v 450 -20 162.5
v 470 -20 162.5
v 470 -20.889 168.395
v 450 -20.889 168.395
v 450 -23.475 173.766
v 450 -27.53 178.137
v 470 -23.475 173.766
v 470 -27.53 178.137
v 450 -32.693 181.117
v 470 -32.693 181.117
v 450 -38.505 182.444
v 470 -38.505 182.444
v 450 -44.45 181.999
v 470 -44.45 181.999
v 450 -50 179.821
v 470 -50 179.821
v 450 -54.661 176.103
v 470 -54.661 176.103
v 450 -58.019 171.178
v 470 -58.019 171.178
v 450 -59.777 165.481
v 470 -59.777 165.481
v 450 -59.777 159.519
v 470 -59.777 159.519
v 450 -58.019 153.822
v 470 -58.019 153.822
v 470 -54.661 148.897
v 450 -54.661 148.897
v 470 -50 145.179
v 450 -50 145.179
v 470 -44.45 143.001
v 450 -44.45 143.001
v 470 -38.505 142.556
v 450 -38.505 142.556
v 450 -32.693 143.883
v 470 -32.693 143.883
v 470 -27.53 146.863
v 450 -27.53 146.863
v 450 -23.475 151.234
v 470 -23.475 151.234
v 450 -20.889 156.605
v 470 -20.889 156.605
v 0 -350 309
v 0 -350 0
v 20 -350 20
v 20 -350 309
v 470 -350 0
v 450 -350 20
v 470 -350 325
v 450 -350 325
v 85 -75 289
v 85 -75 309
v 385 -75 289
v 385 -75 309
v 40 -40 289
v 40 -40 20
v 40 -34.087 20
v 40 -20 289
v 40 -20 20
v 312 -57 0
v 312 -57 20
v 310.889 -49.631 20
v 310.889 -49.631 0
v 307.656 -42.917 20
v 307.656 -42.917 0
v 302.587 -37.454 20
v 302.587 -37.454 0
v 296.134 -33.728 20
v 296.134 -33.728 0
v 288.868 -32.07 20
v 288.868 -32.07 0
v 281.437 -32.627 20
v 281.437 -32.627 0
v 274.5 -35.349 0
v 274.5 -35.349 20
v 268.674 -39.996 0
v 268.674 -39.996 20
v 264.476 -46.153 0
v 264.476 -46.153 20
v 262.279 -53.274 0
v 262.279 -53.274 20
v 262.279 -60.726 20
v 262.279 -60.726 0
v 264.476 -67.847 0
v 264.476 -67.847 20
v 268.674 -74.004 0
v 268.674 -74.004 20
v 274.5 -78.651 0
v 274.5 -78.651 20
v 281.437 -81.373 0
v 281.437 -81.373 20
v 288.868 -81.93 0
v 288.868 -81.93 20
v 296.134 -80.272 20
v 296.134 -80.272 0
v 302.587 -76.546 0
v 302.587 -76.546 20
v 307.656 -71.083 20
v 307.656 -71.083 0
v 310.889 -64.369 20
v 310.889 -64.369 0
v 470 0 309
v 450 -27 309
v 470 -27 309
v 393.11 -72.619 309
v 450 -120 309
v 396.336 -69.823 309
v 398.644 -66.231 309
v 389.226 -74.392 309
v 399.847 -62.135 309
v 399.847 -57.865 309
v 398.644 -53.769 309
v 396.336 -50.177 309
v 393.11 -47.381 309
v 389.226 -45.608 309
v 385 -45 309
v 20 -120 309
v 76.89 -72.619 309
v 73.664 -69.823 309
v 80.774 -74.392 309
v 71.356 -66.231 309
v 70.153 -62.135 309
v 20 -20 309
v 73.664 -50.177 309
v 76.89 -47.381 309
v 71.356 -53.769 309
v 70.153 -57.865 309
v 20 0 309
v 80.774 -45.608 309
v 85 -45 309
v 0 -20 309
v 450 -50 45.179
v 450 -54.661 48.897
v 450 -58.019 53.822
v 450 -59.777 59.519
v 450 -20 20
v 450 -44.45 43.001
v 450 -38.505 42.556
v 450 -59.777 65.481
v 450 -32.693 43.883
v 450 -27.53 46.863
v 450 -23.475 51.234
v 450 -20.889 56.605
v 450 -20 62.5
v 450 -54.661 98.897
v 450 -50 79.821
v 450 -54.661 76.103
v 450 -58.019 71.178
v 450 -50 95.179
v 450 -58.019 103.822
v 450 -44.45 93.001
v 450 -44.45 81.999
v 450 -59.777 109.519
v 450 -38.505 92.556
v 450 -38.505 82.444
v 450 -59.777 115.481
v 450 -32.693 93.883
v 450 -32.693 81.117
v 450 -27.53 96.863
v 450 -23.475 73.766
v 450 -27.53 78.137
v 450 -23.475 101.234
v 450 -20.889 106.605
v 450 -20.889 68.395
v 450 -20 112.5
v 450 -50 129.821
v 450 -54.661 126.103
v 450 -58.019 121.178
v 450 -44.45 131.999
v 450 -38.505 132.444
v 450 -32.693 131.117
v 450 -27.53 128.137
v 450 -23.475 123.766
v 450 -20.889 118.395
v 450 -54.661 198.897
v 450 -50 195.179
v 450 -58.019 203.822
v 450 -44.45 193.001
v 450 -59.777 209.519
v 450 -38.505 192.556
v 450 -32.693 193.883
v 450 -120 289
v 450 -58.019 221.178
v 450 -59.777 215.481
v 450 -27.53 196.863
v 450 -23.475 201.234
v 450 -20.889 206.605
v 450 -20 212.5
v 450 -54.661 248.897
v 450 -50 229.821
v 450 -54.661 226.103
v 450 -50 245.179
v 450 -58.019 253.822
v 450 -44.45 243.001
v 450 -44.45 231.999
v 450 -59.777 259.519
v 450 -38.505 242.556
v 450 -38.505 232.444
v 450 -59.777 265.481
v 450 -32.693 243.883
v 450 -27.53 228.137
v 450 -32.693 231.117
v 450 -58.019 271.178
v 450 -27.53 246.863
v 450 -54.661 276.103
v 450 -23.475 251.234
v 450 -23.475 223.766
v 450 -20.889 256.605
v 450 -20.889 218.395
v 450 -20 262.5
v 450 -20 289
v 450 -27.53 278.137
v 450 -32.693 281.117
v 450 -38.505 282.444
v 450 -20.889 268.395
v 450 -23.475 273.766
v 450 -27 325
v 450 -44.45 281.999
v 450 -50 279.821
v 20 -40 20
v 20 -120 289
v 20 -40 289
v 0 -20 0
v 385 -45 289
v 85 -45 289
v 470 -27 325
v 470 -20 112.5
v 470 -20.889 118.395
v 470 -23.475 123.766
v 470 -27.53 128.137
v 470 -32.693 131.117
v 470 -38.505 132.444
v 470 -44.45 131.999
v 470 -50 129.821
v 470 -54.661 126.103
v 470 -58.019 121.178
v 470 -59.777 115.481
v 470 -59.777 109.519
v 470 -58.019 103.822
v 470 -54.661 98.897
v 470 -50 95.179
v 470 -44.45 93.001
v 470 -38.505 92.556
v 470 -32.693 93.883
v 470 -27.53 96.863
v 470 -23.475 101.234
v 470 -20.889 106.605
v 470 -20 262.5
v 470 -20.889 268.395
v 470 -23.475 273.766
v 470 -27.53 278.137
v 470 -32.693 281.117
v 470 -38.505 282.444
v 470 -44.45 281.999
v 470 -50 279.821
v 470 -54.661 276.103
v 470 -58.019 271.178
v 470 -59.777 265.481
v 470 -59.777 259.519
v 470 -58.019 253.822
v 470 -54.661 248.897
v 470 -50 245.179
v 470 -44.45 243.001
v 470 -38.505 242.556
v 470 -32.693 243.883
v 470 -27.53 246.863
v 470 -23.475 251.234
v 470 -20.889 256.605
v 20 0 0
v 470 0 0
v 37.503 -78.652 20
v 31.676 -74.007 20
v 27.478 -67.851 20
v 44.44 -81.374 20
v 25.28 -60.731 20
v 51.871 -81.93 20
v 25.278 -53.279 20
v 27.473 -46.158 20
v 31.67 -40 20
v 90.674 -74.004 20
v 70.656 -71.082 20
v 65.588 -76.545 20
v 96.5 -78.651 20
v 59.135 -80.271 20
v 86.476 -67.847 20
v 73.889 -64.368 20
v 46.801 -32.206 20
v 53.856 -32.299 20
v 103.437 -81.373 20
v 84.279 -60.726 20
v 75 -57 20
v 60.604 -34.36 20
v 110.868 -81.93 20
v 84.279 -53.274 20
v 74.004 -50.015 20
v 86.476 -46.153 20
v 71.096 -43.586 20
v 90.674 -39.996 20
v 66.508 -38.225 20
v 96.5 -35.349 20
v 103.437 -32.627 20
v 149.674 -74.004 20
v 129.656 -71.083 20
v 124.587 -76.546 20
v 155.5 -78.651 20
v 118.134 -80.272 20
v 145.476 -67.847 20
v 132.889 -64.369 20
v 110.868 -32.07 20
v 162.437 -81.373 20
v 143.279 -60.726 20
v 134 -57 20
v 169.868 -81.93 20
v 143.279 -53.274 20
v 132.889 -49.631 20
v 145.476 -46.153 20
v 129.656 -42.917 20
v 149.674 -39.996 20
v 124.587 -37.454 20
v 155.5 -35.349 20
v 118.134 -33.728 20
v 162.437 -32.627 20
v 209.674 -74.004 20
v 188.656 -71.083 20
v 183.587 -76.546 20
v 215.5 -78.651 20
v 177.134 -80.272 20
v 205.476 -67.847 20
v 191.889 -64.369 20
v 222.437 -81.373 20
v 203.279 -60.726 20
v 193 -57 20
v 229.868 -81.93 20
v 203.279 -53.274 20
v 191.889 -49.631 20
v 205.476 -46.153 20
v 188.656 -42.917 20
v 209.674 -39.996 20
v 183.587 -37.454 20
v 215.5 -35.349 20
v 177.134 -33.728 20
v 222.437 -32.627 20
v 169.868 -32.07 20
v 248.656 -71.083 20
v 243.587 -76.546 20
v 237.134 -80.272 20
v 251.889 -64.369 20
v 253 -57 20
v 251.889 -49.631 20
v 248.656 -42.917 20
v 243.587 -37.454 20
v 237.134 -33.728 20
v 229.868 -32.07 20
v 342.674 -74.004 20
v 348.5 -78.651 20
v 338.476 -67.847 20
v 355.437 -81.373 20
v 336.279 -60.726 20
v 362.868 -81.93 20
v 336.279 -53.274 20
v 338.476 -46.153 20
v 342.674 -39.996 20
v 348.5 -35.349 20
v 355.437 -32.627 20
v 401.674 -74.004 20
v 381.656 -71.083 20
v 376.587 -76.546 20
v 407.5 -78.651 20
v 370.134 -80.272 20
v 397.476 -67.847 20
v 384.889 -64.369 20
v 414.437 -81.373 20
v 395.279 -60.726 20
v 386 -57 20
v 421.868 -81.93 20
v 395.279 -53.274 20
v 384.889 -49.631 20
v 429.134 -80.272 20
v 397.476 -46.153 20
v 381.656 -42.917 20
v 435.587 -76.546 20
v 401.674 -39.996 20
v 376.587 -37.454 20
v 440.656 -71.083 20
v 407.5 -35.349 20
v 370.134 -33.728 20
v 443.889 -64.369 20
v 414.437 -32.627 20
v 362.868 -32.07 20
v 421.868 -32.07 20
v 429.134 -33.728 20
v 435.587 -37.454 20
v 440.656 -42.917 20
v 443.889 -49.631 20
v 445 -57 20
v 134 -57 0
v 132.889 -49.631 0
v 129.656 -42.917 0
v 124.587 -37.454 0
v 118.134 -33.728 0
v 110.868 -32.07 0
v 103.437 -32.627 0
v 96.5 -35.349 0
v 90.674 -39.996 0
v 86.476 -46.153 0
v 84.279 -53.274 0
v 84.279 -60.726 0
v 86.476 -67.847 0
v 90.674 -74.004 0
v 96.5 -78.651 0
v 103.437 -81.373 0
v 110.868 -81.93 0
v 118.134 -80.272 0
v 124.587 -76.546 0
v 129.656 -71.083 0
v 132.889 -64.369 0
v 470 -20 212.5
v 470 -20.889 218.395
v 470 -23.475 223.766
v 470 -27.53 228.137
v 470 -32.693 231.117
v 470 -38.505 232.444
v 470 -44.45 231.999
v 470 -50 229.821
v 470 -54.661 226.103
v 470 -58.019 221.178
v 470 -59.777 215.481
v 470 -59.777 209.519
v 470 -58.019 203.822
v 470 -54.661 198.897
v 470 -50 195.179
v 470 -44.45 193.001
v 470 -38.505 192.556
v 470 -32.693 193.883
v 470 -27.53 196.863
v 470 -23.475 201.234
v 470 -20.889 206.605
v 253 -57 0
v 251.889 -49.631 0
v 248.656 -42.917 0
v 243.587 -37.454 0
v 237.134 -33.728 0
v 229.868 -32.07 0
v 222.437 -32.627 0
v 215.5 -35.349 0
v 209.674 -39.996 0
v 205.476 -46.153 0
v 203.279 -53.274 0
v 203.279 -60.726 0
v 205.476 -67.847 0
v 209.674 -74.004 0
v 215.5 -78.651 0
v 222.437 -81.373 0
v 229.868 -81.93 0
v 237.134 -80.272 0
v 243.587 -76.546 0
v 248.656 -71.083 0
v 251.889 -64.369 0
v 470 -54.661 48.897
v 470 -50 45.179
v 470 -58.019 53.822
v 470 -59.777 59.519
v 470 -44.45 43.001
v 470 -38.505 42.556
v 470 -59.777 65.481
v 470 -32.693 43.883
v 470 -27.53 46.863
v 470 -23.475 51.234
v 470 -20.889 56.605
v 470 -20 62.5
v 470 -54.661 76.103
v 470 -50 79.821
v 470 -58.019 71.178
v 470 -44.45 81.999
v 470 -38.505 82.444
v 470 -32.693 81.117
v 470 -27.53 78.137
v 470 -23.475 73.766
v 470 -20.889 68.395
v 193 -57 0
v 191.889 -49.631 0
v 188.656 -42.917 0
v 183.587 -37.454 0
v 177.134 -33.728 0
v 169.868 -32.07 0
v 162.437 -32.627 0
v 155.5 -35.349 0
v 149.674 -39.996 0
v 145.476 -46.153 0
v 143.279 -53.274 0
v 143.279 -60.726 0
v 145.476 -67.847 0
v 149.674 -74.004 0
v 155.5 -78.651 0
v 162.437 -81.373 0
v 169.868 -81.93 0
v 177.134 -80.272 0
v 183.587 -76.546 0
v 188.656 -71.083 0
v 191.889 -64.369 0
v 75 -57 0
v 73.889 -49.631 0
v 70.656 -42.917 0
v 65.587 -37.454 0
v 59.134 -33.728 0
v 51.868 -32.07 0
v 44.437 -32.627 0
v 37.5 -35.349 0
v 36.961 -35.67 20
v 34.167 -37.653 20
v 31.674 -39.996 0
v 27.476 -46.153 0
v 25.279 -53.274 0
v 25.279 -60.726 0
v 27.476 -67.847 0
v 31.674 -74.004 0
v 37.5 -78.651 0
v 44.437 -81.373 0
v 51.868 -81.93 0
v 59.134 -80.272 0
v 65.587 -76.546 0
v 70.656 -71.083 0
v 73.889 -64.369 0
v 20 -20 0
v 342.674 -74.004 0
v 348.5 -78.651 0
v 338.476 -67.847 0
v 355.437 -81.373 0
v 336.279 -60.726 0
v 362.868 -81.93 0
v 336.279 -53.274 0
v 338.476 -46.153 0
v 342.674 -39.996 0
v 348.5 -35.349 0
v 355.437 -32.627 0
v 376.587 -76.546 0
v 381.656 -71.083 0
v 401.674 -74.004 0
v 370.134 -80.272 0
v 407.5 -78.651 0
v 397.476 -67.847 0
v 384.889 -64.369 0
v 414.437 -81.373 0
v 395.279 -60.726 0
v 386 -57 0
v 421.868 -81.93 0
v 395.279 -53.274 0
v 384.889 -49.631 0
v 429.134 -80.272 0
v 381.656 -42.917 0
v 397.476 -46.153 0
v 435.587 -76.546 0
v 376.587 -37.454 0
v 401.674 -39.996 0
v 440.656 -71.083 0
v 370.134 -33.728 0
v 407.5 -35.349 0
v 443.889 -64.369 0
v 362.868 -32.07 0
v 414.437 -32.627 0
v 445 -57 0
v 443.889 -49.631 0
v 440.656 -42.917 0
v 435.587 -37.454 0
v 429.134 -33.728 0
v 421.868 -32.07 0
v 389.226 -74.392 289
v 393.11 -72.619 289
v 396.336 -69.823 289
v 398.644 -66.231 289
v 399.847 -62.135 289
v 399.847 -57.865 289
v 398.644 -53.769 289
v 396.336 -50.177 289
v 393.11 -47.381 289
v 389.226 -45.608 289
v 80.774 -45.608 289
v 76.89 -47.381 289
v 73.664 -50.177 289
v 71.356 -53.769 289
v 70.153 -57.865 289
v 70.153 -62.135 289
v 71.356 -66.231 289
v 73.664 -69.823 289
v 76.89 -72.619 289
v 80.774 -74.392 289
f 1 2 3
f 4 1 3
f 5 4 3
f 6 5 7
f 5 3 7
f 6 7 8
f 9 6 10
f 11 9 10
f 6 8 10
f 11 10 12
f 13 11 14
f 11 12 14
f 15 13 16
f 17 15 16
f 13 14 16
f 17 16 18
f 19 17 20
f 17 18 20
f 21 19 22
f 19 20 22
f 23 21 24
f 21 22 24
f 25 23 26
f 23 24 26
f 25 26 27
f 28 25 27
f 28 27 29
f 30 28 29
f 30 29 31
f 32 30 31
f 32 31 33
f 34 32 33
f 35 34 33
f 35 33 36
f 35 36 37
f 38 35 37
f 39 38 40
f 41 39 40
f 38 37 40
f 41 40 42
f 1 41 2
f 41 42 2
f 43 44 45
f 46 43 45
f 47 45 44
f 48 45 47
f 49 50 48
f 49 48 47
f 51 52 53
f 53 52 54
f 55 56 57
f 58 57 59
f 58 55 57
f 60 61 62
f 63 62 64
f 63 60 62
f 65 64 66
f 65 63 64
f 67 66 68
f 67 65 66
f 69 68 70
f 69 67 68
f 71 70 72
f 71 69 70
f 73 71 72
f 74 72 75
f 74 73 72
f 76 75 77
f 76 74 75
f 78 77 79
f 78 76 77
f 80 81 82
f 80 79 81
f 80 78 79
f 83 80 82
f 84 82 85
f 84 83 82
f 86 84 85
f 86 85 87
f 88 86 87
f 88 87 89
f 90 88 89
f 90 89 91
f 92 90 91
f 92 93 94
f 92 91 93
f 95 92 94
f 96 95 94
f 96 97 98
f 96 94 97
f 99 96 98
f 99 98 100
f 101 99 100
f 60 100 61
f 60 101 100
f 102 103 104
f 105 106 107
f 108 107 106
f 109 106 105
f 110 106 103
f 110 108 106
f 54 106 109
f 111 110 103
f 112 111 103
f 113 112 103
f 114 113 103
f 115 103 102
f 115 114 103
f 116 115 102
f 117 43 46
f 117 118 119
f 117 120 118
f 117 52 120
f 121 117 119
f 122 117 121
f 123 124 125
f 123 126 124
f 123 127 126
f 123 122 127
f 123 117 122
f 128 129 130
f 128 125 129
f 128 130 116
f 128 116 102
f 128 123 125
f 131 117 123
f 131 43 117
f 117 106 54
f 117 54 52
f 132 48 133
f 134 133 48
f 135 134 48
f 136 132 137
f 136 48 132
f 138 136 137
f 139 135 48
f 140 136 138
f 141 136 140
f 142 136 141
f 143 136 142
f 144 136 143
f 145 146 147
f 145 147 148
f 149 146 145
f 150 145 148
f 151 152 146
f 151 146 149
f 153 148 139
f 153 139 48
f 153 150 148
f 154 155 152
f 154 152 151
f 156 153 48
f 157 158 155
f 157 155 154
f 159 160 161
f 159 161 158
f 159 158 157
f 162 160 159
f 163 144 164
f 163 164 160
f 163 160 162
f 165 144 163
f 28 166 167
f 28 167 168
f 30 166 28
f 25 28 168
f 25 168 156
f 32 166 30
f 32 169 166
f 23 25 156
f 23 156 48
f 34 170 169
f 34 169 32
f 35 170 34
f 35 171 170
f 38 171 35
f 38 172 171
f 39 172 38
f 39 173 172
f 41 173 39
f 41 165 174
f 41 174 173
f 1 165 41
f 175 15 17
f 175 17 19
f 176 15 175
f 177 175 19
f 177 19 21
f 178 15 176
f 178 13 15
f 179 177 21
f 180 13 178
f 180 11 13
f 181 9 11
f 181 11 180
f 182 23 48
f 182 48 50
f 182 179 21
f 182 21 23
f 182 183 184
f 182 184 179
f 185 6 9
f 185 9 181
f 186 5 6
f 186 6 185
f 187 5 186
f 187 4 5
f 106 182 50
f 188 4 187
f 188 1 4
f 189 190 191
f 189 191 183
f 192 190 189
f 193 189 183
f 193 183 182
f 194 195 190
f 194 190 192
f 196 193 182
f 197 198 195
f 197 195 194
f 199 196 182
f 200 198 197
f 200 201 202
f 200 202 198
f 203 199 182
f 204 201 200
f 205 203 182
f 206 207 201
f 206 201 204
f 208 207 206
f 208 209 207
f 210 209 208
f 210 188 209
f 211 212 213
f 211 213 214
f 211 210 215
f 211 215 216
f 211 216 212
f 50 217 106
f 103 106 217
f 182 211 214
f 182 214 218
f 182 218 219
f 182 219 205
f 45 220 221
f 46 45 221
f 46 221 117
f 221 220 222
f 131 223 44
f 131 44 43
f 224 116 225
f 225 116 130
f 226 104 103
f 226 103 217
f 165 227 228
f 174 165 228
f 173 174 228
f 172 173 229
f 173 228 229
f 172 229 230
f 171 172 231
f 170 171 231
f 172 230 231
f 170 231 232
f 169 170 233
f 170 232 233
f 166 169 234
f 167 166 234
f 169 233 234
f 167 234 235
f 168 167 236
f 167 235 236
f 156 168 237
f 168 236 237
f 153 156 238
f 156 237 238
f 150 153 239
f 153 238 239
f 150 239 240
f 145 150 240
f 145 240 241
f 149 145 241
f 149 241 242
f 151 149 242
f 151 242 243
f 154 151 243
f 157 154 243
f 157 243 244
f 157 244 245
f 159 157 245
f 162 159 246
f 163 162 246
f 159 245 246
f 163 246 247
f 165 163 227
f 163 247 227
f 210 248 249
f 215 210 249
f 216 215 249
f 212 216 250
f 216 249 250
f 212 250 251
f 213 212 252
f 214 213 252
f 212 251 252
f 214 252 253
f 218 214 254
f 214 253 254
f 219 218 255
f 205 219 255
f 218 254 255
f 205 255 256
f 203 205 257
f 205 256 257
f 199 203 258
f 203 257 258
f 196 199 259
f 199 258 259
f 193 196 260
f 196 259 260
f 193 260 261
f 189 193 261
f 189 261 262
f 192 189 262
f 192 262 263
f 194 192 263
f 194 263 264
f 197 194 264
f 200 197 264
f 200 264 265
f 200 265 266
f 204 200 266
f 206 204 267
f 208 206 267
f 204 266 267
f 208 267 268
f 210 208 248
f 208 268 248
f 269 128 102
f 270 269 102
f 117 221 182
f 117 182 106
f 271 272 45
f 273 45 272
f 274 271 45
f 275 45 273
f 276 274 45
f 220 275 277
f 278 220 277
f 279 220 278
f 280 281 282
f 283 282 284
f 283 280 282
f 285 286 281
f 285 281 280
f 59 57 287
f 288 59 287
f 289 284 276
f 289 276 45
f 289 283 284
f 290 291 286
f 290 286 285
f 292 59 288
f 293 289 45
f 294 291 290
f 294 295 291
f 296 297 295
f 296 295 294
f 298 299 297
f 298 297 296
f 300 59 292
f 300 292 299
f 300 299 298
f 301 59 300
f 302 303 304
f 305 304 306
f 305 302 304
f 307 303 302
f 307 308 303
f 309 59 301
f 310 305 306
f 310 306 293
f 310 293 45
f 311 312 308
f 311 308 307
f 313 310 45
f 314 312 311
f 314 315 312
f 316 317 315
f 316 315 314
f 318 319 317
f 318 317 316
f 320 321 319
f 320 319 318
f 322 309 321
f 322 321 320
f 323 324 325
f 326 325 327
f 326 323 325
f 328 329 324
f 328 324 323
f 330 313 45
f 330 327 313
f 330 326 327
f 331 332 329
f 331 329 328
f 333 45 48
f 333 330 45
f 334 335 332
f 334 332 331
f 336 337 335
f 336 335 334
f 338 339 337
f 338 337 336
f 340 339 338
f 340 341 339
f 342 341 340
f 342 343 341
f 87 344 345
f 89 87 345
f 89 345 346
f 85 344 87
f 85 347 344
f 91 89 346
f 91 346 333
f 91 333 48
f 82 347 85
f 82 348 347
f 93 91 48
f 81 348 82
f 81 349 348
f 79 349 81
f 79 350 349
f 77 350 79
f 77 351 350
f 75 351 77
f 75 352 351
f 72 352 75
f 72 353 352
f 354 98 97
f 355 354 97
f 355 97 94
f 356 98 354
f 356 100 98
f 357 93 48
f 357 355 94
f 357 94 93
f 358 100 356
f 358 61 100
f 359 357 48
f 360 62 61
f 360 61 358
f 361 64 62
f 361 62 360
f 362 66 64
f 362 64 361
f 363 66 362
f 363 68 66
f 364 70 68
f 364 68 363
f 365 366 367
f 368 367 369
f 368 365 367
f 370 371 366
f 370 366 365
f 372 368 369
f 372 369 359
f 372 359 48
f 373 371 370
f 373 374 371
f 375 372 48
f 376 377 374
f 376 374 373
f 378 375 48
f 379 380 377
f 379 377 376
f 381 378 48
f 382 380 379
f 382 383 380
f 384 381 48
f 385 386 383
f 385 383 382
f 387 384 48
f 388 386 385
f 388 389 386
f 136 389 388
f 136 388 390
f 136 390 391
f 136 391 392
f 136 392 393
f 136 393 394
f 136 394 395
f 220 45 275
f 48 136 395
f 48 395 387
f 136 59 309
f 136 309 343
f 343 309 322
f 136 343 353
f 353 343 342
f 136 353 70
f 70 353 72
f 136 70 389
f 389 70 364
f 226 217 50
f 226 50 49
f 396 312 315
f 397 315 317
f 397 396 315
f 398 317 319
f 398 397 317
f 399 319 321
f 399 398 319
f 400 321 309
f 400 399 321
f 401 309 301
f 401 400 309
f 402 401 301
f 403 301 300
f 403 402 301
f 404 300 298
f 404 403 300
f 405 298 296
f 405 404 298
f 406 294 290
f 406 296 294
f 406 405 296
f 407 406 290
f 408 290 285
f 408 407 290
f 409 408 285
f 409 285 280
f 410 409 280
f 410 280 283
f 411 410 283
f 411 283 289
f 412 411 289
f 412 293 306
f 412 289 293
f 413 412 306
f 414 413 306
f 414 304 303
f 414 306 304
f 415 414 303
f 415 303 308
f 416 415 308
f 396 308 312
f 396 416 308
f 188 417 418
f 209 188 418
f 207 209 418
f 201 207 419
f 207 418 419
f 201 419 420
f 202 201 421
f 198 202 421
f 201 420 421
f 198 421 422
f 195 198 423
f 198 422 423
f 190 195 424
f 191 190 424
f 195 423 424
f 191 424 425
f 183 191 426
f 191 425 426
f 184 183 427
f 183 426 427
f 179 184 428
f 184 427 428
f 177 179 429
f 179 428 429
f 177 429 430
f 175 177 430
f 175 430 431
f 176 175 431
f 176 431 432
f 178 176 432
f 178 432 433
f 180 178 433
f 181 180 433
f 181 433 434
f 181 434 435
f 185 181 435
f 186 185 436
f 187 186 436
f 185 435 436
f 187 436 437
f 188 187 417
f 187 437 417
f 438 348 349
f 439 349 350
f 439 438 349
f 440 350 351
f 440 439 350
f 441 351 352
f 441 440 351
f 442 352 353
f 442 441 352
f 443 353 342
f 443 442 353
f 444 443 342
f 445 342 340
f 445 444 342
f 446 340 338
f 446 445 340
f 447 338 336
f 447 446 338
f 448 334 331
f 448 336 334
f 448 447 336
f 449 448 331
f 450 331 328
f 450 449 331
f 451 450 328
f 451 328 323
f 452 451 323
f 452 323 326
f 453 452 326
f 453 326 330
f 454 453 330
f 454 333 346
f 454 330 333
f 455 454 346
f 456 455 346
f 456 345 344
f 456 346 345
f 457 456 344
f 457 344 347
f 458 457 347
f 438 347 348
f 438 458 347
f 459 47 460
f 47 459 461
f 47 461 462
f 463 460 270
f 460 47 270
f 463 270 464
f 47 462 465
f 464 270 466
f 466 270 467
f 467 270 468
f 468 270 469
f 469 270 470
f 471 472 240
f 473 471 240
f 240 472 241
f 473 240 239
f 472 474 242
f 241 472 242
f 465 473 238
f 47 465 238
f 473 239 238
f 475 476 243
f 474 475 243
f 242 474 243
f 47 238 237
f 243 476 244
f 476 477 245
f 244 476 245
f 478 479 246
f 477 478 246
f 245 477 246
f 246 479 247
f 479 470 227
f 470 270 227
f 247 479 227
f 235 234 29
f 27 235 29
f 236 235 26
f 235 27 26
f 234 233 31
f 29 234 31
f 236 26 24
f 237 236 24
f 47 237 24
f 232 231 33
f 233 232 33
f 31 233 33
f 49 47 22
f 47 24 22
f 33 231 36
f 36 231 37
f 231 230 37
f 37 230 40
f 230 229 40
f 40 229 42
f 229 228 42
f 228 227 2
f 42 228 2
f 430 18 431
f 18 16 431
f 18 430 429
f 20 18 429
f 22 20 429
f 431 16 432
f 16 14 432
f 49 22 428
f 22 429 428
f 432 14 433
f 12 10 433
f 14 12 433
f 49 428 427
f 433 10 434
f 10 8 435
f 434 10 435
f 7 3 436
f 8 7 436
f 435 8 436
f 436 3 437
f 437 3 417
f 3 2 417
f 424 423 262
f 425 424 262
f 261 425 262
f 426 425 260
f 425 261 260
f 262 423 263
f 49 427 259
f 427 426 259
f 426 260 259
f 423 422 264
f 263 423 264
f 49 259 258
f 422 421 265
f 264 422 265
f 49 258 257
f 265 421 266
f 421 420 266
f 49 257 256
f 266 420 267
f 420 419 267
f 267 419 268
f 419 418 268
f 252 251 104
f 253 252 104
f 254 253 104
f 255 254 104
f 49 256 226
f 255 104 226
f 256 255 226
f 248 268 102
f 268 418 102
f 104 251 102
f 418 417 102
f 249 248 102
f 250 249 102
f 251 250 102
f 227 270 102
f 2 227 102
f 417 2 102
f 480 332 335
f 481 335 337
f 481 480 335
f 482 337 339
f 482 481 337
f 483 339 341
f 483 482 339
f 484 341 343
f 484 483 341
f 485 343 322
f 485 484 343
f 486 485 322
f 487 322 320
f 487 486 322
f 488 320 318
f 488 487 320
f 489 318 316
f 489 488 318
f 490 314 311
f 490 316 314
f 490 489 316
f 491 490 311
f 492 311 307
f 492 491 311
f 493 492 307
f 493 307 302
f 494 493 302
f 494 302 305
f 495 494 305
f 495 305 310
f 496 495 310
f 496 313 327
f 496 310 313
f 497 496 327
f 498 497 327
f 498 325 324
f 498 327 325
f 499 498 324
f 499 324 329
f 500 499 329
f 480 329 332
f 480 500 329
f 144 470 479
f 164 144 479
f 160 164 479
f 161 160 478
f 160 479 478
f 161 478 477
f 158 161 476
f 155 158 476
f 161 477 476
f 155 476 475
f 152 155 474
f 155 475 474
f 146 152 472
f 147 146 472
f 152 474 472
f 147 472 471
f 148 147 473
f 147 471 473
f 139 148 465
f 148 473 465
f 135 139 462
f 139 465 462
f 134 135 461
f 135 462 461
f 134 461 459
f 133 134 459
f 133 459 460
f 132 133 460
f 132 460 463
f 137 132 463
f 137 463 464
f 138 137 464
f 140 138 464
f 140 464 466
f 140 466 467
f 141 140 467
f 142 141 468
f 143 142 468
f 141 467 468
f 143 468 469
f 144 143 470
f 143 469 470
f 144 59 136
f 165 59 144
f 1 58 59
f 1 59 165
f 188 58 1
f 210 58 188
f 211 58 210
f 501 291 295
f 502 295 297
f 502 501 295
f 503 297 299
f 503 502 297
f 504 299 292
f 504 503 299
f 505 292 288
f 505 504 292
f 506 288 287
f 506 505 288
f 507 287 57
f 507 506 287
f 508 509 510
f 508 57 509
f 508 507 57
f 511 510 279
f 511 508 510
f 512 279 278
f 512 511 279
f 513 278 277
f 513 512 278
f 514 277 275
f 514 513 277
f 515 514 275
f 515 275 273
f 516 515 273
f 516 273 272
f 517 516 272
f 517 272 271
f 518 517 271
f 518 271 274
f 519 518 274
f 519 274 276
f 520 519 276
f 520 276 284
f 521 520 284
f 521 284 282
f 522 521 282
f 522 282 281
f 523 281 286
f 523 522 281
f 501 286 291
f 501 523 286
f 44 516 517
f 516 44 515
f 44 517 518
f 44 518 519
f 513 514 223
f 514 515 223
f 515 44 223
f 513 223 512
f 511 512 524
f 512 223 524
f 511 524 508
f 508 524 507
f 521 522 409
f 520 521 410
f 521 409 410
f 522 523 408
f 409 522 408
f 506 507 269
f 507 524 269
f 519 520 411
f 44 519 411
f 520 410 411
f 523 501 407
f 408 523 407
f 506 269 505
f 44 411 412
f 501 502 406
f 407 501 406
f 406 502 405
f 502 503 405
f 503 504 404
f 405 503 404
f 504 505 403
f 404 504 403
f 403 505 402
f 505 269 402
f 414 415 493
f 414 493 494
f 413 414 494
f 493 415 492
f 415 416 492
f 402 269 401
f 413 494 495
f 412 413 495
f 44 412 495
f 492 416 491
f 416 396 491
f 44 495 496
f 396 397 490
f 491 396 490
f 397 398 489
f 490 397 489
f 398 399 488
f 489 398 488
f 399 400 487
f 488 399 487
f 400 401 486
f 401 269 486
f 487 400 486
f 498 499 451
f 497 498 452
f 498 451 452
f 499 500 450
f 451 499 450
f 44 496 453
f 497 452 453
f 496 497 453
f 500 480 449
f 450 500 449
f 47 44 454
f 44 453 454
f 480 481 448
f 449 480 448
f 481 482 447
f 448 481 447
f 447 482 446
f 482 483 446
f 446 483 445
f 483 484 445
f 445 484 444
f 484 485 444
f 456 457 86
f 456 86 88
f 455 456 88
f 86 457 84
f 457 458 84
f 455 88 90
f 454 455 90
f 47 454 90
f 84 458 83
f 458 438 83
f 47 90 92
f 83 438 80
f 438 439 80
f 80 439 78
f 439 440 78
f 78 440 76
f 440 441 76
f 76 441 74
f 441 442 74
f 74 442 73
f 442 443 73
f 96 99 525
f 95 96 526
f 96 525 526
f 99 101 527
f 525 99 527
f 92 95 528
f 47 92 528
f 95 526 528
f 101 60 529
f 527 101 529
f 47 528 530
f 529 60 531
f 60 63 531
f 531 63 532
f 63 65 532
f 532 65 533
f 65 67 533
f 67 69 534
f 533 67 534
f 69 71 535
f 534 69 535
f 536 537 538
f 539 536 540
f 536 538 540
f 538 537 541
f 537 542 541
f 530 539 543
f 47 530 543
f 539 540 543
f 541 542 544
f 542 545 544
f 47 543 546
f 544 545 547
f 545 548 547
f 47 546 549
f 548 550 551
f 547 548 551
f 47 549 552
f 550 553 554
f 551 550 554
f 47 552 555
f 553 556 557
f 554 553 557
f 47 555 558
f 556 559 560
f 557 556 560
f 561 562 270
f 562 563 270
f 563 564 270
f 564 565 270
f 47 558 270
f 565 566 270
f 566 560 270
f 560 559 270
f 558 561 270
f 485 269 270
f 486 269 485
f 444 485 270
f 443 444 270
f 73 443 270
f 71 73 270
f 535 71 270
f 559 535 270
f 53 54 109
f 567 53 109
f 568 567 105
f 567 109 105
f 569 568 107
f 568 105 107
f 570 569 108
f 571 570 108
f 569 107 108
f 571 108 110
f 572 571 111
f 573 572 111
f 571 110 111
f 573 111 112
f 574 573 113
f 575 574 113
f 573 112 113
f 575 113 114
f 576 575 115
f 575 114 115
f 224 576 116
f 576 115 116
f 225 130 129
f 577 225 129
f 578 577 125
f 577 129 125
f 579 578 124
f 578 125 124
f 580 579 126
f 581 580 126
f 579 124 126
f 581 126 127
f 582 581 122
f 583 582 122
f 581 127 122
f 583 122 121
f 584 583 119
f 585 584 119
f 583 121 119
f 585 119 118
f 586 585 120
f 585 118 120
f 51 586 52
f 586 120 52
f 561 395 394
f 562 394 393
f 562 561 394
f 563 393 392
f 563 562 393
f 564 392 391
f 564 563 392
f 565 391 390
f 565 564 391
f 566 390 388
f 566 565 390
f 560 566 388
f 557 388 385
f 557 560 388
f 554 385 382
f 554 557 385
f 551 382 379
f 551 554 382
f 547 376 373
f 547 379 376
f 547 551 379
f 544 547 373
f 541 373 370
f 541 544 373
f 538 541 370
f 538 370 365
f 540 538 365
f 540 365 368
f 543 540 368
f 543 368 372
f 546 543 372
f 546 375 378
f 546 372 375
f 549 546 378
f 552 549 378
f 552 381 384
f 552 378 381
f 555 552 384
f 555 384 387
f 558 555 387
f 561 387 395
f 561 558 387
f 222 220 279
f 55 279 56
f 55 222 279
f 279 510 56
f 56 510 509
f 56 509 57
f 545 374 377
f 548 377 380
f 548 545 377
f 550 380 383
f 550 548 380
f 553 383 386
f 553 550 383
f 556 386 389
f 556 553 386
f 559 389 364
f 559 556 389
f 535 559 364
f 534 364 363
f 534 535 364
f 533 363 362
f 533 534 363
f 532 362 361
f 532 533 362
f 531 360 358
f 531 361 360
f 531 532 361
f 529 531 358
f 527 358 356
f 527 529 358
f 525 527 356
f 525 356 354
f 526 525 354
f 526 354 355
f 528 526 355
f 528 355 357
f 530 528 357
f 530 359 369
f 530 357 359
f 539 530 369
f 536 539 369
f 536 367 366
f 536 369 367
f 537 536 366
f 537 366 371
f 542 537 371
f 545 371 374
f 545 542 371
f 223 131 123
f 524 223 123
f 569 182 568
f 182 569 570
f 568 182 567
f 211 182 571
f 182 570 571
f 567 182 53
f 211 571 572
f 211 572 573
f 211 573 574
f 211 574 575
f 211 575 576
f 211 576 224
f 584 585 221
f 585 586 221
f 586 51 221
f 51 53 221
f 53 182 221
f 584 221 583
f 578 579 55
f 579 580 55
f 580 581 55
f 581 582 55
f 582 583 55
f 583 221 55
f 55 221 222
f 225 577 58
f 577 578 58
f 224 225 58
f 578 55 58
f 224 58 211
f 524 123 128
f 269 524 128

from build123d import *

# Parameters (mm, degrees)
F0_W      = 470
F0_H      = 325
F1_DEPTH  = 350
F2_T      = -20
F3_W      = 27
F3_H      = 16
F4_DEPTH  = 470.001
F5_R      = 25
F6_DEPTH  = 325.001
F7_R      = 20
F8_DEPTH  = 20
F9_W      = 20
F9_H      = 16
F10_DEPTH = 323.001
F11_W     = 20
F11_H     = 20
F12_DEPTH = 289
F13_W     = 20
F13_H     = 20
F14_DEPTH = 309.001
F15_W     = 100
F15_H     = 20
F16_DEPTH = 430
F18_DEPTH = 20


with BuildPart() as f1:
    # F0 (on Front) → F1 (new body)
    with BuildSketch(Plane.XZ):
        with Locations((235, 162.5)):
            Rectangle(F0_W, F0_H)
    extrude(amount=F1_DEPTH)

    # F2
    f2_openings = [f1.faces().sort_by_distance(p)[0] for p in [
        (235, -350, 162.5),
        (235, -175, 325),
    ]]
    offset(amount=F2_T, openings=f2_openings)

    # F3 (on face) → F4 (cut, through all)
    with BuildSketch(Plane.YZ.offset(470)):
        with Locations((-13.5, 317)):
            Rectangle(F3_W, F3_H)
    extrude(amount=-F4_DEPTH, mode=Mode.SUBTRACT)

    # F5 (on Top) → F6 (cut, through all)
    with BuildSketch(Plane.XY):
        with Locations((50, -57)):
            Circle(F5_R)
        with Locations((109, -57)):
            Circle(F5_R)
        with Locations((168, -57)):
            Circle(F5_R)
        with Locations((361, -57)):
            Circle(F5_R)
        with Locations((420, -57)):
            Circle(F5_R)
        with Locations((228, -57)):
            Circle(F5_R)
        with Locations((287, -57)):
            Circle(F5_R)
    extrude(amount=F6_DEPTH, mode=Mode.SUBTRACT)

    # F7 (on face) → F8 (cut, through all)
    with BuildSketch(Plane.YZ.offset(470)):
        with Locations((-40, 62.5)):
            Circle(F7_R)
        with BuildLine():
            ThreePointArc((-60, 162.5), (-40, 142.5), (-20, 162.5))
            ThreePointArc((-20, 162.5), (-40, 182.5), (-60, 162.5))
        make_face()
        with Locations((-40, 212.5)):
            Circle(F7_R)
        with Locations((-40, 262.5)):
            Circle(F7_R)
        with Locations((-40, 112.5)):
            Circle(F7_R)
    extrude(amount=-F8_DEPTH, mode=Mode.SUBTRACT)

    # F9 (on face) → F10 (cut, through all)
    with BuildSketch(Plane(origin=(0, -27, 0), x_dir=(-1, 0, 0), z_dir=(0, 1, 0))):
        with Locations((-10, 317)):
            Rectangle(F9_W, F9_H)
    extrude(amount=-F10_DEPTH, mode=Mode.SUBTRACT)

    # F11 (on face) → F12 (join, through all)
    with BuildSketch(Plane.XY.offset(309)):
        with Locations((30, -30)):
            Rectangle(F11_W, F11_H)
    extrude(amount=-F12_DEPTH)

    # F13 (on face) → F14 (cut, through all)
    with BuildSketch(Plane.XY.offset(309)):
        with Locations((10, -10)):
            Rectangle(F13_W, F13_H)
    extrude(amount=-F14_DEPTH, mode=Mode.SUBTRACT)

    # F15 (on face) → F16 (join, through all)
    with BuildSketch(Plane.YZ.offset(20)):
        with Locations((-70, 299)):
            Rectangle(F15_W, F15_H)
    extrude(amount=F16_DEPTH)

    # F17 (on face) → F18 (cut, through all)
    with BuildSketch(Plane.XY.offset(309)):
        with BuildLine():
            Line((85, -60), (85, -45))
            ThreePointArc((85, -45), (70, -60), (85, -75))
            Line((85, -75), (85, -60))
        make_face()
        Polygon((235, -45), (85, -45), (85, -60), (85, -75), (235, -75), align=None)
        with BuildLine():
            Line((385, -45), (235, -45))
            Line((235, -45), (235, -75))
            Line((235, -75), (385, -75))
            ThreePointArc((385, -75), (400, -60), (385, -45))
        make_face()
    extrude(amount=-F18_DEPTH, mode=Mode.SUBTRACT)


solid = f1.part
